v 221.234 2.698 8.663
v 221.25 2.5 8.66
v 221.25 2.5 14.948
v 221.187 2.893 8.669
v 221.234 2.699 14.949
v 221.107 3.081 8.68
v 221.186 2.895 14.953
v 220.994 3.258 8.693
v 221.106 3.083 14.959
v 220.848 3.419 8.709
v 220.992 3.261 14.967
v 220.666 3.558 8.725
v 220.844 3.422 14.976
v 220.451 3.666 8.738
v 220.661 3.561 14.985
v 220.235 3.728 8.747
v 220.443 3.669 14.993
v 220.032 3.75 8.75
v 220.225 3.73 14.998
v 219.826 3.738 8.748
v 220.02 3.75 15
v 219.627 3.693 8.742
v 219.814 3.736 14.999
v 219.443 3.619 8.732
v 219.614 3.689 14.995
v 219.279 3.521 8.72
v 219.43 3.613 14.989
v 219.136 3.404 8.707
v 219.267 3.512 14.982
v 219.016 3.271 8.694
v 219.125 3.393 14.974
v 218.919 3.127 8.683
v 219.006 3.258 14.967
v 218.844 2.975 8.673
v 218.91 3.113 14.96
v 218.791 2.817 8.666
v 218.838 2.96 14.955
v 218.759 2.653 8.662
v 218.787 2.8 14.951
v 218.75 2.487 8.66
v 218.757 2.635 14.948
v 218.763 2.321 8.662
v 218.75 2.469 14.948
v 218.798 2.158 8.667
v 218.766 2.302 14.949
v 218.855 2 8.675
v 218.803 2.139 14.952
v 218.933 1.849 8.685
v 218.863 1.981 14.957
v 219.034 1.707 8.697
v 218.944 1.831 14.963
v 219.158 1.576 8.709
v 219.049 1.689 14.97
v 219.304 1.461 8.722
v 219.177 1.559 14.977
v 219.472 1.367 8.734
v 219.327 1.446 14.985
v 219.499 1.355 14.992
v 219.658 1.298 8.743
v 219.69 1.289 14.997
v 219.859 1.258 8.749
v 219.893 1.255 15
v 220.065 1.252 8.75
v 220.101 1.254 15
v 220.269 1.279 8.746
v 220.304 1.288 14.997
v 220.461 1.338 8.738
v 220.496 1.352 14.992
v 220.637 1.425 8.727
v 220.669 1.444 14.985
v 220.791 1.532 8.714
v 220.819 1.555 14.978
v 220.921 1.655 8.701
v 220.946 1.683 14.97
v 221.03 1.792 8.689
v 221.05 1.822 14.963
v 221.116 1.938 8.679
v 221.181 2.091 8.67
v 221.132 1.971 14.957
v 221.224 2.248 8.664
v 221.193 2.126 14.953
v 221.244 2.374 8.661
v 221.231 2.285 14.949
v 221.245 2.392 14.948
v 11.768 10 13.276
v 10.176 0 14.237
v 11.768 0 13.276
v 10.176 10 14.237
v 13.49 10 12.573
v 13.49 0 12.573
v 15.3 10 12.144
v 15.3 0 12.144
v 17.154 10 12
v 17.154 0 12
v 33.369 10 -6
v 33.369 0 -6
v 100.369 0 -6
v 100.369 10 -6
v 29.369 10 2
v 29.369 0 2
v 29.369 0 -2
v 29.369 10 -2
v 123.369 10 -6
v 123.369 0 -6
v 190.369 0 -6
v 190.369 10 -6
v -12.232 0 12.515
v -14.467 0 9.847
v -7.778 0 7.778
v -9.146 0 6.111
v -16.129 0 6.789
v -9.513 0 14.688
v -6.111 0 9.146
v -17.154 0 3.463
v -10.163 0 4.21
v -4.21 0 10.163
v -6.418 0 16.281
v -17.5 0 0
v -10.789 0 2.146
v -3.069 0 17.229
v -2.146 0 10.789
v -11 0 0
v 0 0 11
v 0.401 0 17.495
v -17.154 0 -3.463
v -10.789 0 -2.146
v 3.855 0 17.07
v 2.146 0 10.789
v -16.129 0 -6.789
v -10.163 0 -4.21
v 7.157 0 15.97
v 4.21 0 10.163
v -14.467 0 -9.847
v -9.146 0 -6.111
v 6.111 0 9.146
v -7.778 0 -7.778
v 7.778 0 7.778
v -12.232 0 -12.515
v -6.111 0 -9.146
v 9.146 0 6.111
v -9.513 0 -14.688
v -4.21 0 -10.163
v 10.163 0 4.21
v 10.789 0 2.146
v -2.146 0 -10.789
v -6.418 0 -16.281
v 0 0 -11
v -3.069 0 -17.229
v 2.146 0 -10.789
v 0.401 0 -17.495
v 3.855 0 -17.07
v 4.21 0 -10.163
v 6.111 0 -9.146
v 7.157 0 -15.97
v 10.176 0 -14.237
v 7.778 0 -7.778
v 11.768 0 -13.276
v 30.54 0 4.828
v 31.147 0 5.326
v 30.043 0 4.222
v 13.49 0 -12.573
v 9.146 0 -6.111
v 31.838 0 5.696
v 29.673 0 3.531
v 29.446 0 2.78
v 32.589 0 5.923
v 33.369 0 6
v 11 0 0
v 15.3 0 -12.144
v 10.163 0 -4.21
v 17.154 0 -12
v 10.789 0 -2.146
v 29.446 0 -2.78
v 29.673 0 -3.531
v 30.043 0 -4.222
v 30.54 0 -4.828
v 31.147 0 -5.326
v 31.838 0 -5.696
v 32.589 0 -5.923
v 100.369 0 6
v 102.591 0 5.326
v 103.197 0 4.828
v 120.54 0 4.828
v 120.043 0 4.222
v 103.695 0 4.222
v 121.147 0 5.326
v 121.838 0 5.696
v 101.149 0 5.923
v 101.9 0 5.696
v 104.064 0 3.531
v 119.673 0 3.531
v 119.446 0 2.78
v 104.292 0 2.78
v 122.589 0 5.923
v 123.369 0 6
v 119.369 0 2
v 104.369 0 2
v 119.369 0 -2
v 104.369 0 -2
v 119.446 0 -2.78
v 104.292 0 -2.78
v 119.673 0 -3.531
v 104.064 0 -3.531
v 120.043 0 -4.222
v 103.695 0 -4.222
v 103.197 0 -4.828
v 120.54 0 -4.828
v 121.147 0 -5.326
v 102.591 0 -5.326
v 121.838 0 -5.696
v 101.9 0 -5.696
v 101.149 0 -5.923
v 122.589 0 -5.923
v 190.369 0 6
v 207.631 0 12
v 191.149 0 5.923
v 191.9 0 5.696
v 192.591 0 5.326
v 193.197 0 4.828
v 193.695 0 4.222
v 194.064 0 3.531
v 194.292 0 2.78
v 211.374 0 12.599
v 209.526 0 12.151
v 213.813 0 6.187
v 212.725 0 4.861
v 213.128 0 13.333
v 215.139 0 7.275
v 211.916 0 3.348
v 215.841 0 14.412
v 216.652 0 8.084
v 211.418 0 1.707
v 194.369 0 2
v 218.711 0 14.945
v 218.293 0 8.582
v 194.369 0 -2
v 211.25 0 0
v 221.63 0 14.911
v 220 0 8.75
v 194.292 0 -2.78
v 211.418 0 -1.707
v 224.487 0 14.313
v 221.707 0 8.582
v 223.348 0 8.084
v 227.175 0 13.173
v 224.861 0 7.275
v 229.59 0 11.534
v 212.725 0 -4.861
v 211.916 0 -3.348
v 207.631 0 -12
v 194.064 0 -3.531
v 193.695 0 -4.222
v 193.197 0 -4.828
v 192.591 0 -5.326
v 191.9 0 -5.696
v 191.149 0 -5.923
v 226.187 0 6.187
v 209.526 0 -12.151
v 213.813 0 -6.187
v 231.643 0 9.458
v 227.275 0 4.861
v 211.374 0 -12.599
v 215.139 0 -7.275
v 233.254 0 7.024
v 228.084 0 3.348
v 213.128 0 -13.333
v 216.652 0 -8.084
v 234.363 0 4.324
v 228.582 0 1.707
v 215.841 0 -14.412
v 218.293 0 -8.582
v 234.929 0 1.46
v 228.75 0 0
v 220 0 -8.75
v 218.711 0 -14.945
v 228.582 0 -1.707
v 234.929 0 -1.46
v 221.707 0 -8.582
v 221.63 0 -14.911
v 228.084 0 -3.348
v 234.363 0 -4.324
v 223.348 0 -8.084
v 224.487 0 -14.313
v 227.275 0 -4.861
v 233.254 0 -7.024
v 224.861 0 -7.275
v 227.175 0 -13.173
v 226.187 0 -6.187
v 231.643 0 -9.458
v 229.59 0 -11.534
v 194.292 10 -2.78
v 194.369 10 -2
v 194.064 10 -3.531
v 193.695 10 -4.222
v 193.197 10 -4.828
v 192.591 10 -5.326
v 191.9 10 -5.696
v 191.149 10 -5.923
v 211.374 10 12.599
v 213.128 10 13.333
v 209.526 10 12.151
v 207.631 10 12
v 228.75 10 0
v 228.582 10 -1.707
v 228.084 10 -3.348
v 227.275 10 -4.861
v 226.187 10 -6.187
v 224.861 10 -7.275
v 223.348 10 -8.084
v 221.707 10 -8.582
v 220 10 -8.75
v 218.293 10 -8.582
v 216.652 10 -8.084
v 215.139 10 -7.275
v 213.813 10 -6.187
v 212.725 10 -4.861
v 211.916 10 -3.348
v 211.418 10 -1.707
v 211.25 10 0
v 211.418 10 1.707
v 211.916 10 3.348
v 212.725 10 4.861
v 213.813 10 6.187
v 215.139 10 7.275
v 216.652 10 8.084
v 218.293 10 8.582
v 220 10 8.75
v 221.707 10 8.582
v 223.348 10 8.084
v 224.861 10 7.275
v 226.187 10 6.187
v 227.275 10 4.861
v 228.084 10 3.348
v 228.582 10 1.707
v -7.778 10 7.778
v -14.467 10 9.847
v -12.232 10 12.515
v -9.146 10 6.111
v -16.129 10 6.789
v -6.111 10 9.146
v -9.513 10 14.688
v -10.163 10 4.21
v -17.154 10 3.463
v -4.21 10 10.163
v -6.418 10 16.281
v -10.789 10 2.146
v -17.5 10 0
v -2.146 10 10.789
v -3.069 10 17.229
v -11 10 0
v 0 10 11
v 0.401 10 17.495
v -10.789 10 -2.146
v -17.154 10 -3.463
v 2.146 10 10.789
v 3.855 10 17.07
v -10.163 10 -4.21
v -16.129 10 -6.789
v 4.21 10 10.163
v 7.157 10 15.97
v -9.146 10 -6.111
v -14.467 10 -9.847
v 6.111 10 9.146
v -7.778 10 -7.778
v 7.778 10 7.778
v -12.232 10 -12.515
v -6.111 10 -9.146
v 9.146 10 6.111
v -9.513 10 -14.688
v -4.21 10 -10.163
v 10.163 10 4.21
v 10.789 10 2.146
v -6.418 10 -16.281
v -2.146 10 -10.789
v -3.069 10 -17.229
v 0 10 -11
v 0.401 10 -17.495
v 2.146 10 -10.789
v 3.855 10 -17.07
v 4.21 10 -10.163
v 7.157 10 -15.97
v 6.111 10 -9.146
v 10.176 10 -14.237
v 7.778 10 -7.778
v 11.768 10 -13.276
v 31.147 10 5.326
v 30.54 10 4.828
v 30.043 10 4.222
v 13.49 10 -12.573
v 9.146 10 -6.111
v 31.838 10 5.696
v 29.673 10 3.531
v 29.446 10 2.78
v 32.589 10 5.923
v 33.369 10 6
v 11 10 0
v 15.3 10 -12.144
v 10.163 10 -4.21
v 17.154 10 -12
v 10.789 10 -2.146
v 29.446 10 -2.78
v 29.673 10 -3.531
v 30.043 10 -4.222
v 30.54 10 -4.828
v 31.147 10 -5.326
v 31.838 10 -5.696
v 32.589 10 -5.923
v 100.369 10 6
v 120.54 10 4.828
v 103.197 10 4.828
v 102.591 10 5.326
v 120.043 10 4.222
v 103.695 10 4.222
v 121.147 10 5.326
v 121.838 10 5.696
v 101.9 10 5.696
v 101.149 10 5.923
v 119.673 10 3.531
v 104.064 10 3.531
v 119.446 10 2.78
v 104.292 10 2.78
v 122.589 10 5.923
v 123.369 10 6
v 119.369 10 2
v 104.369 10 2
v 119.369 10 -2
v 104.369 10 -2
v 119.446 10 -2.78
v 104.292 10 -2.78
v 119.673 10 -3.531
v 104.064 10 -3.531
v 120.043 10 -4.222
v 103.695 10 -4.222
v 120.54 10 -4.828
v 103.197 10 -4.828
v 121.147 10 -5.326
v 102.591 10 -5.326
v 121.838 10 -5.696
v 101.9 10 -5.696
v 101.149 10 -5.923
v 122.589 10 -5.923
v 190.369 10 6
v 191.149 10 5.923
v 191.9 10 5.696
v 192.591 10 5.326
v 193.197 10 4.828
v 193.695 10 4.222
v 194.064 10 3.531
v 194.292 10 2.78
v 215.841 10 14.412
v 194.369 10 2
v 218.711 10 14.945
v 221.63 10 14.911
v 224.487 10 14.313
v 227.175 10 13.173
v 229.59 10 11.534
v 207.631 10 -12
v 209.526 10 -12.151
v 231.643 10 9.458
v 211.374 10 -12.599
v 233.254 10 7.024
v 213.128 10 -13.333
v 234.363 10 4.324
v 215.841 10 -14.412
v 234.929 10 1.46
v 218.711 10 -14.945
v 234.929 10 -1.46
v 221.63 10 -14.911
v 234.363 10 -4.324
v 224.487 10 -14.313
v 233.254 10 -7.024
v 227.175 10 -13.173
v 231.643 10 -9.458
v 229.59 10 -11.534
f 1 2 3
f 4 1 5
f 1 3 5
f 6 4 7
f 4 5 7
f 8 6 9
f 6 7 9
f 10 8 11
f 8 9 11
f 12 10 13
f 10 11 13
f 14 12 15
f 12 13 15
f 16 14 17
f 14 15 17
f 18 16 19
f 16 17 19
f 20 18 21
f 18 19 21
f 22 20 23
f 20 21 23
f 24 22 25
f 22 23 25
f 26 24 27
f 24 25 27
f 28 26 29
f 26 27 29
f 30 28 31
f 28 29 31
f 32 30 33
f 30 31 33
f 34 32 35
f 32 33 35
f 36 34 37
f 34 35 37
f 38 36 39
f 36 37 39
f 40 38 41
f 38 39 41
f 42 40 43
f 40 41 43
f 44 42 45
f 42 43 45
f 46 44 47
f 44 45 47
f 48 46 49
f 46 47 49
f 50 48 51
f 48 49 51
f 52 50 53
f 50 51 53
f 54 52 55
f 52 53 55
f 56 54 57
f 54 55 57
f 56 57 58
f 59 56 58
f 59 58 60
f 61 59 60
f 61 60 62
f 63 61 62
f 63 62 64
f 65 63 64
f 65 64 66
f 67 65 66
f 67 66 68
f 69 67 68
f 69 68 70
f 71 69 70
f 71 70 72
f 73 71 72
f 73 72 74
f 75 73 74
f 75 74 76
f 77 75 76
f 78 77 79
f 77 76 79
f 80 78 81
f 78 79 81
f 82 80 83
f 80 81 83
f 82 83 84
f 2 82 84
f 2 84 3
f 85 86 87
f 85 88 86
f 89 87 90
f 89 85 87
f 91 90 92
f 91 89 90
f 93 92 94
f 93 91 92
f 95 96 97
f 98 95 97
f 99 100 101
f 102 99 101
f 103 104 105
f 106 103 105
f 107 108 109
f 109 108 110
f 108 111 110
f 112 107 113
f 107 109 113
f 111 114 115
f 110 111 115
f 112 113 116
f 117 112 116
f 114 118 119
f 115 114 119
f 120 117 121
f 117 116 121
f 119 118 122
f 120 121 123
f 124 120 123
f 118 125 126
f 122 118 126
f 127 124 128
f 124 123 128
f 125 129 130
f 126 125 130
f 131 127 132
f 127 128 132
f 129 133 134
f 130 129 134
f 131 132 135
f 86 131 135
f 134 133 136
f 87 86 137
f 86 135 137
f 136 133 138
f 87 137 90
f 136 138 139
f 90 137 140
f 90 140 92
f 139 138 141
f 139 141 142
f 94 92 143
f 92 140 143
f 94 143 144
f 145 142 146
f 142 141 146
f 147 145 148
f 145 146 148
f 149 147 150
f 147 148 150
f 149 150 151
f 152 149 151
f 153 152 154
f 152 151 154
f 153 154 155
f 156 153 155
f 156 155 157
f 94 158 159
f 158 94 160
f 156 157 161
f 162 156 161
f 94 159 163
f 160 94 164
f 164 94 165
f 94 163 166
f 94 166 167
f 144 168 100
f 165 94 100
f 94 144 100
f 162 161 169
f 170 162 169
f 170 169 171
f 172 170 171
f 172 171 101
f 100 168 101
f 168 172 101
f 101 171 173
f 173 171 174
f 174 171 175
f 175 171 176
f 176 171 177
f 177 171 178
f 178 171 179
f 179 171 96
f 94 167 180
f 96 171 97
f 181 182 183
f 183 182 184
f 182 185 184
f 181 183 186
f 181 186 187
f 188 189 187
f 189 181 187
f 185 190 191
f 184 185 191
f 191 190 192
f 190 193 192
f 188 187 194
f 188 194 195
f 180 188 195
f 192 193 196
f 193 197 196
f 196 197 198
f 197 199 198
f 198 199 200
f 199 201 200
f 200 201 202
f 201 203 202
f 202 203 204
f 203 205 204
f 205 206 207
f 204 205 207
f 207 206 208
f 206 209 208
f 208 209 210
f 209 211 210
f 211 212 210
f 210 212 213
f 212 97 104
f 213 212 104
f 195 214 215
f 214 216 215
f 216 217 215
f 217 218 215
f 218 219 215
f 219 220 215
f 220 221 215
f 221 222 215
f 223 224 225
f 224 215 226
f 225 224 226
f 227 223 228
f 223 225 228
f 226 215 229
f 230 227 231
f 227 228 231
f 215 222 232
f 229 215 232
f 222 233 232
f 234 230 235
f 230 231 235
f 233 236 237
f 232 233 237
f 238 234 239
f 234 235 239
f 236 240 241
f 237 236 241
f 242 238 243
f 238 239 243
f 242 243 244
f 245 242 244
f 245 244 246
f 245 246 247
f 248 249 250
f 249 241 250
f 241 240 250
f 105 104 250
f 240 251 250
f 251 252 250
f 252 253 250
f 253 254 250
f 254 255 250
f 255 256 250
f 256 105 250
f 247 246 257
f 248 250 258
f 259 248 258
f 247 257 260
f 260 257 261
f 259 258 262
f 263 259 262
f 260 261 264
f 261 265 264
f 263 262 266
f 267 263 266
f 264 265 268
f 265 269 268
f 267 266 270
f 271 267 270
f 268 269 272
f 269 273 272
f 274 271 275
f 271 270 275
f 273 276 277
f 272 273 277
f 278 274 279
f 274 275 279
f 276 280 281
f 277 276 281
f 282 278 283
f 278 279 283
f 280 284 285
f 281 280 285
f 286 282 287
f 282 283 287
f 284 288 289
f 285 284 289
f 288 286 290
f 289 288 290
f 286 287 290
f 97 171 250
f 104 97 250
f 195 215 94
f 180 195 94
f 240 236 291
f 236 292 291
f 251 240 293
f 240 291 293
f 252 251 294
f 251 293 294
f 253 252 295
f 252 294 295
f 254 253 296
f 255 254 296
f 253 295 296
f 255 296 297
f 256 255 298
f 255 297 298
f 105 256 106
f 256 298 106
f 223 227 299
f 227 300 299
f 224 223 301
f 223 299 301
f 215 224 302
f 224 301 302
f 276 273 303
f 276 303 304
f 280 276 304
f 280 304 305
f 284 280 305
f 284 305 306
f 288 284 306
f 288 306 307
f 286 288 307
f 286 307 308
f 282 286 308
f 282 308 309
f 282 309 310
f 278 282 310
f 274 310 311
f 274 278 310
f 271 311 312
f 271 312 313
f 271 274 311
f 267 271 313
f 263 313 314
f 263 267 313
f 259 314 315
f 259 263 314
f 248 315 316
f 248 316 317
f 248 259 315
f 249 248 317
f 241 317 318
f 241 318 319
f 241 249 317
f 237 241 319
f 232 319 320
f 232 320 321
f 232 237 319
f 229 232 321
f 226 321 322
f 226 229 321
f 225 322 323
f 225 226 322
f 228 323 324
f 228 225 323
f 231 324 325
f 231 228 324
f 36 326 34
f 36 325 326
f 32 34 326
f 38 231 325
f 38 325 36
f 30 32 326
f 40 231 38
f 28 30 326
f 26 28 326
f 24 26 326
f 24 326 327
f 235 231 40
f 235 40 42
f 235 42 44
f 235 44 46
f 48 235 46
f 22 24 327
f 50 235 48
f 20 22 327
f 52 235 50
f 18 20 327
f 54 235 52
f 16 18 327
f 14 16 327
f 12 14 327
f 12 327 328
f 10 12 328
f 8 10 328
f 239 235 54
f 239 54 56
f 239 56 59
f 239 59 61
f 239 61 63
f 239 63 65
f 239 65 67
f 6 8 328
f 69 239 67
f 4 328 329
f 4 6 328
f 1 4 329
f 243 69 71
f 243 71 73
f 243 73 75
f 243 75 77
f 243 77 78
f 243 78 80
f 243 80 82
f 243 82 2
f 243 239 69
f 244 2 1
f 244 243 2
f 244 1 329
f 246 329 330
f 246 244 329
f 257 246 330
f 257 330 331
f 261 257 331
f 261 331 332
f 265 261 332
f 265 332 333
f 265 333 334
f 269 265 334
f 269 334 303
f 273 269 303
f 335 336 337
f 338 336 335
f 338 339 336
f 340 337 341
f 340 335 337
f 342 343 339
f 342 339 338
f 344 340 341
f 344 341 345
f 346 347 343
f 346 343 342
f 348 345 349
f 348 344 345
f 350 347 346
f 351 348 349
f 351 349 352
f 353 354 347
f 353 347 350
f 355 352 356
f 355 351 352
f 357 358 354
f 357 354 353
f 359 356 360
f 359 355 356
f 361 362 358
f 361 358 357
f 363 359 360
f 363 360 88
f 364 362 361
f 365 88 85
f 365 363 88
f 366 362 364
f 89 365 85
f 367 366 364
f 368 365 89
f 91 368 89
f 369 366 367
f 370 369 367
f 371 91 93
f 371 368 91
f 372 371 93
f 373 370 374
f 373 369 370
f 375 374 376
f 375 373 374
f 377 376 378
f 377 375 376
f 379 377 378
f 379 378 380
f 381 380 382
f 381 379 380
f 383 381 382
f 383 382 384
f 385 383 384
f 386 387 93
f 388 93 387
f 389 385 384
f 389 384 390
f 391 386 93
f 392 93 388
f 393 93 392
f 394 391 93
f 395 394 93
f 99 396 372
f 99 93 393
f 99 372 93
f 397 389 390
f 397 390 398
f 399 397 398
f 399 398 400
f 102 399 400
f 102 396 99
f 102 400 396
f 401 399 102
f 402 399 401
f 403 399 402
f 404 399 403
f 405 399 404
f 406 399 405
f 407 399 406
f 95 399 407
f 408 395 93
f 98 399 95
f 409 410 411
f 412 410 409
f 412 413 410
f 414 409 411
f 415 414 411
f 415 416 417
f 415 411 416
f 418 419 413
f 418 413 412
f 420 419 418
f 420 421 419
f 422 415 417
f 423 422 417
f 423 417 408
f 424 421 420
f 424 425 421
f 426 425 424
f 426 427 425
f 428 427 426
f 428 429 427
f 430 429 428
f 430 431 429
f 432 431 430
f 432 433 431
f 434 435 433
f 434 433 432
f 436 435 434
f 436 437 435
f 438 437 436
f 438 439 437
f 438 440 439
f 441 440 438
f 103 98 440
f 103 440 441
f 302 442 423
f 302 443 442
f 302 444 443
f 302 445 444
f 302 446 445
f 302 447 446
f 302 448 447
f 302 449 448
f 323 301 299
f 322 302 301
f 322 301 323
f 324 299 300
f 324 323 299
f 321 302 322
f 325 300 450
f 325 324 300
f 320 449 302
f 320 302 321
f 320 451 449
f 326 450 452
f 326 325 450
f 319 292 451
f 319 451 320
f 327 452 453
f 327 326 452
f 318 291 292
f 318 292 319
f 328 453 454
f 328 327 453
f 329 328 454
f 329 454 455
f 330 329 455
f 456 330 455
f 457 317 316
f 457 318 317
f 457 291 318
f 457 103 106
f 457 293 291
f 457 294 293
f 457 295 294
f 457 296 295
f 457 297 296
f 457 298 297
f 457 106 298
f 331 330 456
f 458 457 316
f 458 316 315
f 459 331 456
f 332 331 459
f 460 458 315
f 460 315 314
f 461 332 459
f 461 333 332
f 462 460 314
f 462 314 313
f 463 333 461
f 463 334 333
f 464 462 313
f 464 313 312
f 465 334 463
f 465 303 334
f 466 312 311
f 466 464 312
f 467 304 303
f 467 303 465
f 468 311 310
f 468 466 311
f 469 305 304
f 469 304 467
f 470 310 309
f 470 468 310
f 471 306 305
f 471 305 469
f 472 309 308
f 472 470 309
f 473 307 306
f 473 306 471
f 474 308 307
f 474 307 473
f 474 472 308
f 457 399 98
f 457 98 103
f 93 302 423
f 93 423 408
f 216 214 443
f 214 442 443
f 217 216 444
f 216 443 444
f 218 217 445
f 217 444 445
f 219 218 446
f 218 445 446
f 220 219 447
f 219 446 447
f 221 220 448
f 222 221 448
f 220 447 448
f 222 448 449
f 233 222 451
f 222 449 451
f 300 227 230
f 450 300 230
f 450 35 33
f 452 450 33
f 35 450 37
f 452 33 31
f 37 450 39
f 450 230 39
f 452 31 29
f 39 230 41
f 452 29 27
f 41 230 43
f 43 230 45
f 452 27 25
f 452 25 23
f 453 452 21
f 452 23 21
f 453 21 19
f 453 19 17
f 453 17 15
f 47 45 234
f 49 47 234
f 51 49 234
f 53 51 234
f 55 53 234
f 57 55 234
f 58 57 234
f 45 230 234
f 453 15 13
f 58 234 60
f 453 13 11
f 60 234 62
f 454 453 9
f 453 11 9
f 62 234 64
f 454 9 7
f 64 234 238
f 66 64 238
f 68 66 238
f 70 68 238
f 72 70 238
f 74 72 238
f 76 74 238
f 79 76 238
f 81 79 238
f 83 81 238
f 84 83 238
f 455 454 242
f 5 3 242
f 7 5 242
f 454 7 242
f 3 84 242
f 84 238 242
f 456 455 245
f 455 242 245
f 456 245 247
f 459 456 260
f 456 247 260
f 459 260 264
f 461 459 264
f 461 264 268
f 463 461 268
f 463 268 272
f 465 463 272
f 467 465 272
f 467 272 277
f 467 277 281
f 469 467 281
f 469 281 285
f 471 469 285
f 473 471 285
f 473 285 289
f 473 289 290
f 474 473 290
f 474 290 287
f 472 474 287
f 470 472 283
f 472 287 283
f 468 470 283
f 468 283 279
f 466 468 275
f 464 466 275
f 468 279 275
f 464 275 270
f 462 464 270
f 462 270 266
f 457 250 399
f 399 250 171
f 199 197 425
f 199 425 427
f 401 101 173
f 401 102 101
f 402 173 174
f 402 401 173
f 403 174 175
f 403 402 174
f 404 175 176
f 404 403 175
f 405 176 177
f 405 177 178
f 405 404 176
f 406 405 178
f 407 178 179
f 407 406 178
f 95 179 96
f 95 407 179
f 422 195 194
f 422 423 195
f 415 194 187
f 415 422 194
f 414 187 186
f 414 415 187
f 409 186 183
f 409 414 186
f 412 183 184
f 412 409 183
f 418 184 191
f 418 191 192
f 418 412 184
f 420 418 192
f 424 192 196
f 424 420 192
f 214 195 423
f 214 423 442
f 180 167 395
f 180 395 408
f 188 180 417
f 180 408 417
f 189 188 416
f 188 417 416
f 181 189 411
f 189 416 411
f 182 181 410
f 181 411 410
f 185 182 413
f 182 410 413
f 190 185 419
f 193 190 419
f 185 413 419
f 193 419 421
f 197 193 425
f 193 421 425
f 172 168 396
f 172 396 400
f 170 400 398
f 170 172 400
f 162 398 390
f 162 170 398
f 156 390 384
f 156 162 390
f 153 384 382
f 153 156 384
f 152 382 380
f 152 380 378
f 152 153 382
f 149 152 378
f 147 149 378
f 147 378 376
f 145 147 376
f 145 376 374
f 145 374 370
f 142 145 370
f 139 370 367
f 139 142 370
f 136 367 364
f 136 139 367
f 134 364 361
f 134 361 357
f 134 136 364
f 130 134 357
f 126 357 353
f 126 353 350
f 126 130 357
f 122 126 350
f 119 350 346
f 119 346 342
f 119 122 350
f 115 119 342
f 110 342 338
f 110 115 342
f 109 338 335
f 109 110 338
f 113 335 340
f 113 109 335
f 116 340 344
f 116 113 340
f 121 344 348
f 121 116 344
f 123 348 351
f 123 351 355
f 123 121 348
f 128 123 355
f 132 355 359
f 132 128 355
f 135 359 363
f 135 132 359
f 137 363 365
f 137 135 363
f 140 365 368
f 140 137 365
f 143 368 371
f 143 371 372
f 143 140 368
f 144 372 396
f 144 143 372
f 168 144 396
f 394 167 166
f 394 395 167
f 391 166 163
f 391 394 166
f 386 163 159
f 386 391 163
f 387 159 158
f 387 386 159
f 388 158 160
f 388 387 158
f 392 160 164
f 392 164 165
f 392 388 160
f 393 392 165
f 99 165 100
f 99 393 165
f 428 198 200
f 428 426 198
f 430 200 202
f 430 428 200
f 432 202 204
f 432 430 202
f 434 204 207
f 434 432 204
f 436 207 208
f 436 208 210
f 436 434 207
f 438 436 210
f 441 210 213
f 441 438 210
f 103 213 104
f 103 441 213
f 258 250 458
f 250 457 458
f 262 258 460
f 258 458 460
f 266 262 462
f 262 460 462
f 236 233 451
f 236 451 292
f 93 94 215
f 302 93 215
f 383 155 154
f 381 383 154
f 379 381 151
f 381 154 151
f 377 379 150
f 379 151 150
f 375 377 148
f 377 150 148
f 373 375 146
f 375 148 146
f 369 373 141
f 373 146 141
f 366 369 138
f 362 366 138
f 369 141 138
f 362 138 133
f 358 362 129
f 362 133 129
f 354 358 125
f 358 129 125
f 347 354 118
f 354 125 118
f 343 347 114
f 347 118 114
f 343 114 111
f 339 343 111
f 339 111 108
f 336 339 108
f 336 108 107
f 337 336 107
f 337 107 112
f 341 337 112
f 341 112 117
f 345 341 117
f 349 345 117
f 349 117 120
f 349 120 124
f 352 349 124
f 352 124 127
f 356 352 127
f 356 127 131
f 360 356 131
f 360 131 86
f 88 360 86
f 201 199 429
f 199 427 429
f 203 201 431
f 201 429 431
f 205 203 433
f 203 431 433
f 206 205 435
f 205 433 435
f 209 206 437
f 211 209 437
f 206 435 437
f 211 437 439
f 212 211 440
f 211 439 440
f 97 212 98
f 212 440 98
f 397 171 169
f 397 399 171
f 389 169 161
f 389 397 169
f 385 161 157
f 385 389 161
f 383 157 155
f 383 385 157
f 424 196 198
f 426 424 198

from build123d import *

# Parameters (mm, degrees)
SKETCH1_W           = 75
SKETCH1_H           = 12
SKETCH1_R           = 17.5
SKETCH1_R_2         = 11
SKETCH1_R_3         = 15
SKETCH1_R_4         = 8.75
BOSS_EXTRUDE1_DEPTH = 10
FILLET1_R           = 4
FILLET2_R           = 12
SKETCH2_R           = 1.25
CUT_EXTRUDE1_DEPTH  = 9


with BuildPart() as part:
    # Sketch1 → Boss-Extrude1 (new body)
    with BuildSketch(Plane(origin=(0, 0, 0), x_dir=(1, 0, 0), z_dir=(0, 1, 0))):
        with BuildLine():
            Line((211, 12), (12.737739203, 12))
            ThreePointArc((12.737739203, 12), (16.265921985, 6.45521355), (17.5, 0))
            ThreePointArc((17.5, 0), (16.265921985, -6.45521355), (12.737739203, -12))
            Line((12.737739203, -12), (211, -12))
            ThreePointArc((211, -12), (205, 0), (211, 12))
        make_face()
        with Locations((66.868869601, 0)):
            Rectangle(SKETCH1_W, SKETCH1_H, mode=Mode.SUBTRACT)
        with Locations((156.868869601, 0)):
            Rectangle(SKETCH1_W, SKETCH1_H, mode=Mode.SUBTRACT)
        Circle(SKETCH1_R)
        Circle(SKETCH1_R_2, mode=Mode.SUBTRACT)
        with Locations((220, 0)):
            Circle(SKETCH1_R_3)
        with Locations((220, 0)):
            Circle(SKETCH1_R_4, mode=Mode.SUBTRACT)
    extrude(amount=BOSS_EXTRUDE1_DEPTH)

    # Fillet1
    fillet1_edges = [part.edges().sort_by_distance(p)[0] for p in [
        (119.368869601, 5, -6),
        (119.368869601, 5, 6),
        (194.368869601, 5, 6),
        (194.368869601, 5, -6),
        (29.368869601, 5, -6),
        (29.368869601, 5, 6),
        (104.368869601, 5, 6),
        (104.368869601, 5, -6),
    ]]
    fillet(fillet1_edges, radius=FILLET1_R)

    # Fillet2
    fillet2_edges = [part.edges().sort_by_distance(p)[0] for p in [
        (12.737739203, 5, 12),
        (12.737739203, 5, -12),
        (211, 5, -12),
        (211, 5, 12),
    ]]
    fillet(fillet2_edges, radius=FILLET2_R)

    # Sketch2 → Cut-Extrude1 (cut, symmetric)
    with BuildSketch(Plane.XY.offset(12)):
        with Locations((220, 2.5)):
            Circle(SKETCH2_R)
    extrude(amount=CUT_EXTRUDE1_DEPTH, both=True, mode=Mode.SUBTRACT)


solid = part.part
